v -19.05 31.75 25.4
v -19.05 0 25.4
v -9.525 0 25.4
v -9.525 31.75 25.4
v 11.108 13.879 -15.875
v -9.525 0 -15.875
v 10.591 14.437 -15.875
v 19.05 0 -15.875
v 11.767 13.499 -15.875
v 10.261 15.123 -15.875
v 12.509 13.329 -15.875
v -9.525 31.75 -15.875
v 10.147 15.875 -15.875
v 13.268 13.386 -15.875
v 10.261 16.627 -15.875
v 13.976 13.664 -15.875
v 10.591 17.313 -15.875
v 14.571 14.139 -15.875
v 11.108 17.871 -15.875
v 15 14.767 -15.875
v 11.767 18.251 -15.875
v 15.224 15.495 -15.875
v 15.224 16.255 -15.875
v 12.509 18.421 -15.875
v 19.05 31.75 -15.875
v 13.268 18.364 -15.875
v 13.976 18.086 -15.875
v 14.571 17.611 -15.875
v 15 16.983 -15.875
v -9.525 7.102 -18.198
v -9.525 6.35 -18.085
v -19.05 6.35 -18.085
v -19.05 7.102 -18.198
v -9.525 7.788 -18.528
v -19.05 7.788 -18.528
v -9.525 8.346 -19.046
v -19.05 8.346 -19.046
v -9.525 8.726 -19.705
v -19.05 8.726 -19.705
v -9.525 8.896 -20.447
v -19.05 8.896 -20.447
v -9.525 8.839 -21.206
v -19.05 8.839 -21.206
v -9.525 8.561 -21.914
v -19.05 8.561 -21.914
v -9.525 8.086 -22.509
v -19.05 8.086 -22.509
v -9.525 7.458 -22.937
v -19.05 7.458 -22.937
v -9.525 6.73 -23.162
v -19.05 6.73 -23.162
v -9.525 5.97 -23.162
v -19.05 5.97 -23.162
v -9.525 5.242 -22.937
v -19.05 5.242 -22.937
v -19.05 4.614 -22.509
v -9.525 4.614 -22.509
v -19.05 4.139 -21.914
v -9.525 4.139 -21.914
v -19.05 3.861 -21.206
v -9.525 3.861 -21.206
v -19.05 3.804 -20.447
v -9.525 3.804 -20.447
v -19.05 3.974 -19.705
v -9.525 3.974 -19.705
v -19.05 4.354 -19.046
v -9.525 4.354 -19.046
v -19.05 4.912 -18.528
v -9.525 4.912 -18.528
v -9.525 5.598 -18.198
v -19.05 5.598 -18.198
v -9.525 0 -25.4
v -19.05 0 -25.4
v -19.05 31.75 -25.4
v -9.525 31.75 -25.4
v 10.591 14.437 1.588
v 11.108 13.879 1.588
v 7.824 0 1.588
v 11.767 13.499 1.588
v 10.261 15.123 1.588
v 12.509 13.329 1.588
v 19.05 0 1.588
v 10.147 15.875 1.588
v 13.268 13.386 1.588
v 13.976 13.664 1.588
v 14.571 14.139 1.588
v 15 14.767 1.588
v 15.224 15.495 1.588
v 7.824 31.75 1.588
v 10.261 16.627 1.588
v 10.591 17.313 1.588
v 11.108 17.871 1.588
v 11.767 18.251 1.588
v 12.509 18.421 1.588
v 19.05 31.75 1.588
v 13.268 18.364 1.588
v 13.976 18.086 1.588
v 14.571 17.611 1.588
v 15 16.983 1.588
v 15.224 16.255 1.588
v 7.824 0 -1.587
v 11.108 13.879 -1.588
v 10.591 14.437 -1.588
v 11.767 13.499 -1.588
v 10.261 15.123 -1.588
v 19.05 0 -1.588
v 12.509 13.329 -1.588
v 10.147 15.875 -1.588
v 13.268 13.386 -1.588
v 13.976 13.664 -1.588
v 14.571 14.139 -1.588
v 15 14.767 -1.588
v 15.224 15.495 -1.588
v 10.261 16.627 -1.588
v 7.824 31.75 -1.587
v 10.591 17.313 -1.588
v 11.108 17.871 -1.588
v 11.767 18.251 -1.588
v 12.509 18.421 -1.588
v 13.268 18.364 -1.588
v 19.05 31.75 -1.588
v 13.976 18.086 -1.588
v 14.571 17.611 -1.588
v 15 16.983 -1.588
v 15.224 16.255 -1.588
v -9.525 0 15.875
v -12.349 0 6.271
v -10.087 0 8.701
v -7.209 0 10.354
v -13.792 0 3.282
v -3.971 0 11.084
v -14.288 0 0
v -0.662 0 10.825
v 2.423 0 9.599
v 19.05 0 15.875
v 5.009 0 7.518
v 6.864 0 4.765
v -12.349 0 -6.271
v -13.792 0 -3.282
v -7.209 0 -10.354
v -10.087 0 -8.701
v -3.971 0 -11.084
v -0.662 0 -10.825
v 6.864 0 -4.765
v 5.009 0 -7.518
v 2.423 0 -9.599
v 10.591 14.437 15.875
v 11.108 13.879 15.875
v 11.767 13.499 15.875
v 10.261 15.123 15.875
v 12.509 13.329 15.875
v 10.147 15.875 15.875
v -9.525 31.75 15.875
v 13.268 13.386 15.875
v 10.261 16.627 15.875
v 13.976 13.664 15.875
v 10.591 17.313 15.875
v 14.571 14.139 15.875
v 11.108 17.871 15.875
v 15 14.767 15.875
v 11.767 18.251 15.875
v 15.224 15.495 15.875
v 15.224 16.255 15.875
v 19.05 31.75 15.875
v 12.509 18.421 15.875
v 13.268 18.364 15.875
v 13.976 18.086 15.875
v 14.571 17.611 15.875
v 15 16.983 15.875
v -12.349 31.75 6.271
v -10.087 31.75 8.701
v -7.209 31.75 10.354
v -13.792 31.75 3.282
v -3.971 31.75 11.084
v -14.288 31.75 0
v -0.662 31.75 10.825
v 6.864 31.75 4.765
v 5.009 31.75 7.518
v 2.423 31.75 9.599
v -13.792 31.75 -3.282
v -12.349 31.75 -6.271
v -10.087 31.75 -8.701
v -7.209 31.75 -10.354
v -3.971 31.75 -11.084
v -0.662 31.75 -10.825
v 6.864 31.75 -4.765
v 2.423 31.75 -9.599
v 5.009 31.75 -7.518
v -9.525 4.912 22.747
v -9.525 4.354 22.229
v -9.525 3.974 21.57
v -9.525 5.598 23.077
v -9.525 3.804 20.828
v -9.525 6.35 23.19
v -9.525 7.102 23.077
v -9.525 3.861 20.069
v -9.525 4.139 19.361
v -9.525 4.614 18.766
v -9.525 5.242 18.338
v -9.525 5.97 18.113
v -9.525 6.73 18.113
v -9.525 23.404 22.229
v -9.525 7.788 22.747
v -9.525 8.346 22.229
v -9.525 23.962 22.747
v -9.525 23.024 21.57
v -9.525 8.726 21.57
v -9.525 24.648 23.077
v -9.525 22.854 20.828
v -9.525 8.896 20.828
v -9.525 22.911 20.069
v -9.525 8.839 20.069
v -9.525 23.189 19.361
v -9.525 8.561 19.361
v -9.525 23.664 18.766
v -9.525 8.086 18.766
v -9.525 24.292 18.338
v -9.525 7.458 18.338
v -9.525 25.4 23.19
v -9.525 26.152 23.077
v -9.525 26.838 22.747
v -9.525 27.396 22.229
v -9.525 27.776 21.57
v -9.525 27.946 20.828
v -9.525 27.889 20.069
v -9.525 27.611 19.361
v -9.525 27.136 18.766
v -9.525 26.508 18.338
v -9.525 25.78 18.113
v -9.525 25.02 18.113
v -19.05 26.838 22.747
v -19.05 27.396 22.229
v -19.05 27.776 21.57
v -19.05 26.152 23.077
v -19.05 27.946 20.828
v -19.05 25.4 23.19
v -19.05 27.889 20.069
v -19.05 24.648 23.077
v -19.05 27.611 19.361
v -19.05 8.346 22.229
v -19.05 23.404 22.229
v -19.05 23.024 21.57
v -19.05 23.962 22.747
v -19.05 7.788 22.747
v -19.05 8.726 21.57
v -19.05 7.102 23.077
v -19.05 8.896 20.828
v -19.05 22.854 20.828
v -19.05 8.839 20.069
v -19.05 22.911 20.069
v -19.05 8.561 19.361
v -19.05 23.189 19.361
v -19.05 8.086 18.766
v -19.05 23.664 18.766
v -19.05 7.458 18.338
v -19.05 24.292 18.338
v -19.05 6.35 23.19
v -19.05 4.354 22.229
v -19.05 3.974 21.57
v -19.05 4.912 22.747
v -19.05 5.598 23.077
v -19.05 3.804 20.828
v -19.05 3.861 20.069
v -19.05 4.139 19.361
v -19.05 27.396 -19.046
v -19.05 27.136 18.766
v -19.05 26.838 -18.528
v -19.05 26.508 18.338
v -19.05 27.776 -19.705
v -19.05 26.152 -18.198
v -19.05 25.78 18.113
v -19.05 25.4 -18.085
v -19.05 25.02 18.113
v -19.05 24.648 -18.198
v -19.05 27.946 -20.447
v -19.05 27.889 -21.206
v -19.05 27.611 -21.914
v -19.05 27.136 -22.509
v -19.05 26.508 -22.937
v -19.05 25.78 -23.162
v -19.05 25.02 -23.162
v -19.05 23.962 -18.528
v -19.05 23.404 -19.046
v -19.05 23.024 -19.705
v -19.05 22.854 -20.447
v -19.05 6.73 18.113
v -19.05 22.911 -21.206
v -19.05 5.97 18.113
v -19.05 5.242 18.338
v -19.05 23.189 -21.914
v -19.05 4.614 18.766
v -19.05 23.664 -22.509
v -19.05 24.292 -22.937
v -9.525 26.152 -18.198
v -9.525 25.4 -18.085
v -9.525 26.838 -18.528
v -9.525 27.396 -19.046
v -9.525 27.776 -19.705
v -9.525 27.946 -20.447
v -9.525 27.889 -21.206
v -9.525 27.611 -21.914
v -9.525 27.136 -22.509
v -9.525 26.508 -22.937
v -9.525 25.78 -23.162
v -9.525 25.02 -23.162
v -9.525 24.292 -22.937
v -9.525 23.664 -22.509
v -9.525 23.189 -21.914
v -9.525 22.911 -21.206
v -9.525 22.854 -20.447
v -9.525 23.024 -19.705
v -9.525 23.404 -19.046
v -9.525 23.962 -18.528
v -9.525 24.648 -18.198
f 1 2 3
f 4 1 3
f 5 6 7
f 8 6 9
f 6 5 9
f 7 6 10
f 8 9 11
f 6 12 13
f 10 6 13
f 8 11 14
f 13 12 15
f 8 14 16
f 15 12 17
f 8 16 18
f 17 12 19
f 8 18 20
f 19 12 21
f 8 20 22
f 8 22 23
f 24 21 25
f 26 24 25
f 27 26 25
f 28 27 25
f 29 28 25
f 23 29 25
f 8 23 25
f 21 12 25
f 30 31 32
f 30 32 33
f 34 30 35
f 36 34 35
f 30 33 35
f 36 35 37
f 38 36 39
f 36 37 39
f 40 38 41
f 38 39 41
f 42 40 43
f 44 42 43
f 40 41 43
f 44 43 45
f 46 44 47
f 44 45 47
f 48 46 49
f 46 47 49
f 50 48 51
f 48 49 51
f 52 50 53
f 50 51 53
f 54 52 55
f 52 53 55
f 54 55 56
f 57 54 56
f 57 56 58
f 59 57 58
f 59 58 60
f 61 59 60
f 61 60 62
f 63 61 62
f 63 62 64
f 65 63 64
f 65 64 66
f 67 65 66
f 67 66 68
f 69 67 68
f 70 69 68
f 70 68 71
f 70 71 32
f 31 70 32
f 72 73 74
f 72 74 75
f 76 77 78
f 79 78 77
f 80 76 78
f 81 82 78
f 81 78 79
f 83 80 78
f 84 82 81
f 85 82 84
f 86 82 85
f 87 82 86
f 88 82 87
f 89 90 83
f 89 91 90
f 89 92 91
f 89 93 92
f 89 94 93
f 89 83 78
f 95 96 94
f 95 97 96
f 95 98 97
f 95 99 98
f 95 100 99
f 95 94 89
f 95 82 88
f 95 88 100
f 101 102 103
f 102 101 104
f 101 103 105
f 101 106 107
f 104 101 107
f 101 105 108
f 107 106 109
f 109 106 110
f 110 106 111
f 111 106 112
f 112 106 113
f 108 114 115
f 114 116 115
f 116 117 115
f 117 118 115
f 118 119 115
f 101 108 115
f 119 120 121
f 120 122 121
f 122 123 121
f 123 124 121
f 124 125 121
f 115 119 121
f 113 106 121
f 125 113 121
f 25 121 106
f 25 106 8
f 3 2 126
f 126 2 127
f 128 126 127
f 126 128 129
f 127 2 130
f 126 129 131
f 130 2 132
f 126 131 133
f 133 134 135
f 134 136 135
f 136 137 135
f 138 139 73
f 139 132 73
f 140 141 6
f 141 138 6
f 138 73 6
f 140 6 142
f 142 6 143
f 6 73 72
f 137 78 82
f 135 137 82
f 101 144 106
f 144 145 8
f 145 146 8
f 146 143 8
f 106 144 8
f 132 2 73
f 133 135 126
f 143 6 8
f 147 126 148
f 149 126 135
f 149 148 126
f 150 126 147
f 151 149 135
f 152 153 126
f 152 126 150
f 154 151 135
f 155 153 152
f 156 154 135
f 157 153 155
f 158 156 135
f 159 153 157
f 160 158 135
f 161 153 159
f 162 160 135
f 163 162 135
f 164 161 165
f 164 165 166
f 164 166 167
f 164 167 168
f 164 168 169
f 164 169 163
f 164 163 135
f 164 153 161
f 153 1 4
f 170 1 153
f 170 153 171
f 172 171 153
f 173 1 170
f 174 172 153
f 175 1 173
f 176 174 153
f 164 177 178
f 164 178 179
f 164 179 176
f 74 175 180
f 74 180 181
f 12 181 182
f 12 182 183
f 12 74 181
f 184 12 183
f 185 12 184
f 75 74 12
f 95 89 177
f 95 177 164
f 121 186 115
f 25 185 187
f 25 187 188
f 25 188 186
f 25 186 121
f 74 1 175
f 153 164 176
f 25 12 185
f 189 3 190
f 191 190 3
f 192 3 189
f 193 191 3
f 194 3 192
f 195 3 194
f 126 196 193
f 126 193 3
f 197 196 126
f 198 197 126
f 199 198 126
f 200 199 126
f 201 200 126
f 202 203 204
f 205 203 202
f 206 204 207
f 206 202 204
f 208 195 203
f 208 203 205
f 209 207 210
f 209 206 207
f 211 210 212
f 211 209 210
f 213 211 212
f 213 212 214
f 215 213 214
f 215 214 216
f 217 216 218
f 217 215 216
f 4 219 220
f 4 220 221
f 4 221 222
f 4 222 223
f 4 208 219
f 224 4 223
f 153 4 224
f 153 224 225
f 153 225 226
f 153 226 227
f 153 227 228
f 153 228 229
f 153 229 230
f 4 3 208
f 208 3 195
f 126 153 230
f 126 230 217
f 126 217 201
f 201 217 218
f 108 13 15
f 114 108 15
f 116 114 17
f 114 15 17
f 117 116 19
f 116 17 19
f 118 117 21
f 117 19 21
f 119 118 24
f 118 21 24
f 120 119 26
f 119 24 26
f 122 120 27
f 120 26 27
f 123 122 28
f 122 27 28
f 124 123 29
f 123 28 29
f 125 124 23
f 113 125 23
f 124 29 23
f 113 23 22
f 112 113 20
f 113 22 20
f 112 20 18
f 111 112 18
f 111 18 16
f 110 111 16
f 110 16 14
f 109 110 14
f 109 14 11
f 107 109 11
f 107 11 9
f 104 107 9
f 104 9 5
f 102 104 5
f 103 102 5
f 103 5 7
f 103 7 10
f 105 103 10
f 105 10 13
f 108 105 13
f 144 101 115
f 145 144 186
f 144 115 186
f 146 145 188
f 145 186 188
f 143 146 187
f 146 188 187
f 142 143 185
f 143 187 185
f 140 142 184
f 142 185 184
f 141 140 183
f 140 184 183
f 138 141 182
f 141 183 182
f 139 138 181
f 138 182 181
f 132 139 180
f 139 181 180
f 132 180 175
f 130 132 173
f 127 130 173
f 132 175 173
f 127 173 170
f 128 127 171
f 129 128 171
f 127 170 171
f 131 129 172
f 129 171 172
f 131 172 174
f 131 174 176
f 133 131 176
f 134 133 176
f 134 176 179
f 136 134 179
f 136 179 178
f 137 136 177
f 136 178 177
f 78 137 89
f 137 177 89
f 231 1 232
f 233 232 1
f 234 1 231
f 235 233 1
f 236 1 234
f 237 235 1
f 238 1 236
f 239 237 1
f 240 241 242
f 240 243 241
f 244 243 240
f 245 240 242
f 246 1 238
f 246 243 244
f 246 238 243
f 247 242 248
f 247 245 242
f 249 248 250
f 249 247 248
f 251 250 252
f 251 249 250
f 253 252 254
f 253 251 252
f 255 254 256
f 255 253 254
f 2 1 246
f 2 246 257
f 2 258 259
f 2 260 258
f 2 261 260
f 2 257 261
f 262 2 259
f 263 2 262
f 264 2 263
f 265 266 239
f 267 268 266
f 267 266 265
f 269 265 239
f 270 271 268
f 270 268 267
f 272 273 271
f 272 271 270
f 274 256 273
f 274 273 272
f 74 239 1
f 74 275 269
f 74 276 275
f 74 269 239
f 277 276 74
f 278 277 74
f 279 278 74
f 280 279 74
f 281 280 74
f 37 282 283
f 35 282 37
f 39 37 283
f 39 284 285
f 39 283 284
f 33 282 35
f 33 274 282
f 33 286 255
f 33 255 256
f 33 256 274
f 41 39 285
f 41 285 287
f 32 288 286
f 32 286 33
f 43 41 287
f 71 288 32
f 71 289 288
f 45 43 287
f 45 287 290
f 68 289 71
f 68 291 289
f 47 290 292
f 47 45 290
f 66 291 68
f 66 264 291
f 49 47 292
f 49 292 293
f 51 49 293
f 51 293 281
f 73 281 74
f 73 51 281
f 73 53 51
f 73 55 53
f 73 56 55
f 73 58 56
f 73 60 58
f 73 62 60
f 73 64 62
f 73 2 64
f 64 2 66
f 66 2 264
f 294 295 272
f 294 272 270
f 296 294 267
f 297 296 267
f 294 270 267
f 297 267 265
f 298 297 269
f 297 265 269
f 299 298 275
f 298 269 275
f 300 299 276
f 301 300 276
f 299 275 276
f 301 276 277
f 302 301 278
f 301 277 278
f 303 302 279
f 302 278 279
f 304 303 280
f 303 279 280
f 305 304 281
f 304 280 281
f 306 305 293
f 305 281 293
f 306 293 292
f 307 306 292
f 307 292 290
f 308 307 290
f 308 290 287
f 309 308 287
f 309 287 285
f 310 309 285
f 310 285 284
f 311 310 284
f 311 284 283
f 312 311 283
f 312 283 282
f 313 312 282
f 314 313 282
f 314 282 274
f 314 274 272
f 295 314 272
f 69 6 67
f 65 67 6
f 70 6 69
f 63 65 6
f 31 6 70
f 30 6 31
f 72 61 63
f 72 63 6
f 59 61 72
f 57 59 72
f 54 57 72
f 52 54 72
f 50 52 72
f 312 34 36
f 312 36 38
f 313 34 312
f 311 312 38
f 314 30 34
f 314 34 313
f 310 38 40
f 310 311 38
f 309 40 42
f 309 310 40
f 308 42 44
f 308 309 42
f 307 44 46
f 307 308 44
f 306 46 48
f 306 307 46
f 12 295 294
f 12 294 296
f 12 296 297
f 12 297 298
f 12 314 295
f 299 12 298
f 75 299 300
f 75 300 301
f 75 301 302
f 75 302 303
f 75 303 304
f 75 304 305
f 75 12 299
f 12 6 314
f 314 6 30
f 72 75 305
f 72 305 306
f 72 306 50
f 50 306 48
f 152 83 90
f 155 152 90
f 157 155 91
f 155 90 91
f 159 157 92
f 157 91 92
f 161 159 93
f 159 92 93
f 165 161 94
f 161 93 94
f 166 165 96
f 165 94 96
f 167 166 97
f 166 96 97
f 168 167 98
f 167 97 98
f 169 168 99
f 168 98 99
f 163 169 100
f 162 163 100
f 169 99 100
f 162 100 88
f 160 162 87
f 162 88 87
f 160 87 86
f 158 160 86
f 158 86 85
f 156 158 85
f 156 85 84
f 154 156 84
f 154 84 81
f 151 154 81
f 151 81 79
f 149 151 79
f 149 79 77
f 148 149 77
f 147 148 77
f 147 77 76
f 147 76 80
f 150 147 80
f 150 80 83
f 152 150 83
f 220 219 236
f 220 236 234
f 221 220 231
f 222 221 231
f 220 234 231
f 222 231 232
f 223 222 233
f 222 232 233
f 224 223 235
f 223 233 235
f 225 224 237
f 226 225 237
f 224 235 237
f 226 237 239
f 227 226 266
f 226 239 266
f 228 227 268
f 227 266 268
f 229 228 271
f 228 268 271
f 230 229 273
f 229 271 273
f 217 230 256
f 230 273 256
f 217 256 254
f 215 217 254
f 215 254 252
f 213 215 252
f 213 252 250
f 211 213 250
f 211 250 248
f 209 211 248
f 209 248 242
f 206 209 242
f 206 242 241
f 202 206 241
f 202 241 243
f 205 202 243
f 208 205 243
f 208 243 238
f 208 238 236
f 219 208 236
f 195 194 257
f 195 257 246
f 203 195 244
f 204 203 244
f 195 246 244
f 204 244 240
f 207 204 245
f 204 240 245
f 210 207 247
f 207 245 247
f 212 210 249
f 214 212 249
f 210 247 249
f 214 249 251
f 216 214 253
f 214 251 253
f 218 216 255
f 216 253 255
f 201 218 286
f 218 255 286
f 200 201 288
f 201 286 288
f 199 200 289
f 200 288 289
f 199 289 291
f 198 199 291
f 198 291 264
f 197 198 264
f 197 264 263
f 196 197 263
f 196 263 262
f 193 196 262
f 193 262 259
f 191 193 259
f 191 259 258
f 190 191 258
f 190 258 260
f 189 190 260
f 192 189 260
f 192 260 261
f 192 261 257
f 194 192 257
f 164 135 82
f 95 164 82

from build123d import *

# Parameters (mm, degrees)
SKETCH1_W                  = 38.1
SKETCH1_H                  = 50.8
BOSS_EXTRUDE1_DEPTH        = 31.75
SKETCH2_R                  = 11.1125
CUT_EXTRUDE1_DEPTH         = 45.901280605
SKETCH3_W                  = 28.575
SKETCH3_H                  = 9.525
CUT_EXTRUDE2_DEPTH         = 45.901280605
F_10_CLEARANCE_HOLE1_D     = 5.1054
F_10_CLEARANCE_HOLE1_DEPTH = 9.652
F_10_CLEARANCE_HOLE1_TIP   = 1.533816902
SKETCH6_W                  = 3.175
SKETCH6_H                  = 31.75
CUT_EXTRUDE3_DEPTH         = 24.13
F_10_CLEARANCE_HOLE2_D     = 5.1054


with BuildPart() as part:
    # Sketch1 → Boss-Extrude1 (new body)
    with BuildSketch(Plane(origin=(0, 0, 0), x_dir=(1, 0, 0), z_dir=(0, 1, 0))):
        Rectangle(SKETCH1_W, SKETCH1_H)
    extrude(amount=BOSS_EXTRUDE1_DEPTH)

    # Sketch2 → Cut-Extrude1 (cut, through all)
    with BuildSketch(Plane(origin=(0, 31.75, 0), x_dir=(1, 0, 0), z_dir=(0, 1, 0))):
        with Locations(Location((-3.175, 0, 0), (0, 0, 270))):
            Circle(SKETCH2_R)
    extrude(amount=-CUT_EXTRUDE1_DEPTH, mode=Mode.SUBTRACT)

    # Sketch3 → Cut-Extrude2 (cut, through all)
    with BuildSketch(Plane(origin=(0, 31.75, 0), x_dir=(1, 0, 0), z_dir=(0, 1, 0))):
        with Locations((4.7625, 20.6375)):
            Rectangle(SKETCH3_W, SKETCH3_H)
        with Locations((4.7625, -20.6375)):
            Rectangle(SKETCH3_W, SKETCH3_H)
    extrude(amount=-CUT_EXTRUDE2_DEPTH, mode=Mode.SUBTRACT)

    # #10 Clearance Hole1
    with Locations(Plane(origin=(-9.525, 0, 0), x_dir=(0, 0, -1), z_dir=(1, 0, 0))):
        with Locations((-20.6375, 25.4), (20.6375, 6.35), (-20.6375, 6.35), (20.6375, 25.4)):
            Hole(F_10_CLEARANCE_HOLE1_D / 2, depth=F_10_CLEARANCE_HOLE1_DEPTH)
            with Locations((0, 0, -(F_10_CLEARANCE_HOLE1_DEPTH + F_10_CLEARANCE_HOLE1_TIP / 2))):  # 118° drill point
                Cone(0, F_10_CLEARANCE_HOLE1_D / 2, F_10_CLEARANCE_HOLE1_TIP, mode=Mode.SUBTRACT)

    # Sketch6 → Cut-Extrude3 (cut)
    with BuildSketch(Plane(origin=(19.05, 0, 0), x_dir=(0, 0, -1), z_dir=(1, 0, 0))):
        with Locations((0, 15.875)):
            Rectangle(SKETCH6_W, SKETCH6_H)
    extrude(amount=-CUT_EXTRUDE3_DEPTH, mode=Mode.SUBTRACT)

    # #10 Clearance Hole2 (through all)
    with Locations(Plane.XY.offset(15.875)):
        with Locations((12.7, 15.875)):
            Hole(F_10_CLEARANCE_HOLE2_D / 2)


solid = part.part
